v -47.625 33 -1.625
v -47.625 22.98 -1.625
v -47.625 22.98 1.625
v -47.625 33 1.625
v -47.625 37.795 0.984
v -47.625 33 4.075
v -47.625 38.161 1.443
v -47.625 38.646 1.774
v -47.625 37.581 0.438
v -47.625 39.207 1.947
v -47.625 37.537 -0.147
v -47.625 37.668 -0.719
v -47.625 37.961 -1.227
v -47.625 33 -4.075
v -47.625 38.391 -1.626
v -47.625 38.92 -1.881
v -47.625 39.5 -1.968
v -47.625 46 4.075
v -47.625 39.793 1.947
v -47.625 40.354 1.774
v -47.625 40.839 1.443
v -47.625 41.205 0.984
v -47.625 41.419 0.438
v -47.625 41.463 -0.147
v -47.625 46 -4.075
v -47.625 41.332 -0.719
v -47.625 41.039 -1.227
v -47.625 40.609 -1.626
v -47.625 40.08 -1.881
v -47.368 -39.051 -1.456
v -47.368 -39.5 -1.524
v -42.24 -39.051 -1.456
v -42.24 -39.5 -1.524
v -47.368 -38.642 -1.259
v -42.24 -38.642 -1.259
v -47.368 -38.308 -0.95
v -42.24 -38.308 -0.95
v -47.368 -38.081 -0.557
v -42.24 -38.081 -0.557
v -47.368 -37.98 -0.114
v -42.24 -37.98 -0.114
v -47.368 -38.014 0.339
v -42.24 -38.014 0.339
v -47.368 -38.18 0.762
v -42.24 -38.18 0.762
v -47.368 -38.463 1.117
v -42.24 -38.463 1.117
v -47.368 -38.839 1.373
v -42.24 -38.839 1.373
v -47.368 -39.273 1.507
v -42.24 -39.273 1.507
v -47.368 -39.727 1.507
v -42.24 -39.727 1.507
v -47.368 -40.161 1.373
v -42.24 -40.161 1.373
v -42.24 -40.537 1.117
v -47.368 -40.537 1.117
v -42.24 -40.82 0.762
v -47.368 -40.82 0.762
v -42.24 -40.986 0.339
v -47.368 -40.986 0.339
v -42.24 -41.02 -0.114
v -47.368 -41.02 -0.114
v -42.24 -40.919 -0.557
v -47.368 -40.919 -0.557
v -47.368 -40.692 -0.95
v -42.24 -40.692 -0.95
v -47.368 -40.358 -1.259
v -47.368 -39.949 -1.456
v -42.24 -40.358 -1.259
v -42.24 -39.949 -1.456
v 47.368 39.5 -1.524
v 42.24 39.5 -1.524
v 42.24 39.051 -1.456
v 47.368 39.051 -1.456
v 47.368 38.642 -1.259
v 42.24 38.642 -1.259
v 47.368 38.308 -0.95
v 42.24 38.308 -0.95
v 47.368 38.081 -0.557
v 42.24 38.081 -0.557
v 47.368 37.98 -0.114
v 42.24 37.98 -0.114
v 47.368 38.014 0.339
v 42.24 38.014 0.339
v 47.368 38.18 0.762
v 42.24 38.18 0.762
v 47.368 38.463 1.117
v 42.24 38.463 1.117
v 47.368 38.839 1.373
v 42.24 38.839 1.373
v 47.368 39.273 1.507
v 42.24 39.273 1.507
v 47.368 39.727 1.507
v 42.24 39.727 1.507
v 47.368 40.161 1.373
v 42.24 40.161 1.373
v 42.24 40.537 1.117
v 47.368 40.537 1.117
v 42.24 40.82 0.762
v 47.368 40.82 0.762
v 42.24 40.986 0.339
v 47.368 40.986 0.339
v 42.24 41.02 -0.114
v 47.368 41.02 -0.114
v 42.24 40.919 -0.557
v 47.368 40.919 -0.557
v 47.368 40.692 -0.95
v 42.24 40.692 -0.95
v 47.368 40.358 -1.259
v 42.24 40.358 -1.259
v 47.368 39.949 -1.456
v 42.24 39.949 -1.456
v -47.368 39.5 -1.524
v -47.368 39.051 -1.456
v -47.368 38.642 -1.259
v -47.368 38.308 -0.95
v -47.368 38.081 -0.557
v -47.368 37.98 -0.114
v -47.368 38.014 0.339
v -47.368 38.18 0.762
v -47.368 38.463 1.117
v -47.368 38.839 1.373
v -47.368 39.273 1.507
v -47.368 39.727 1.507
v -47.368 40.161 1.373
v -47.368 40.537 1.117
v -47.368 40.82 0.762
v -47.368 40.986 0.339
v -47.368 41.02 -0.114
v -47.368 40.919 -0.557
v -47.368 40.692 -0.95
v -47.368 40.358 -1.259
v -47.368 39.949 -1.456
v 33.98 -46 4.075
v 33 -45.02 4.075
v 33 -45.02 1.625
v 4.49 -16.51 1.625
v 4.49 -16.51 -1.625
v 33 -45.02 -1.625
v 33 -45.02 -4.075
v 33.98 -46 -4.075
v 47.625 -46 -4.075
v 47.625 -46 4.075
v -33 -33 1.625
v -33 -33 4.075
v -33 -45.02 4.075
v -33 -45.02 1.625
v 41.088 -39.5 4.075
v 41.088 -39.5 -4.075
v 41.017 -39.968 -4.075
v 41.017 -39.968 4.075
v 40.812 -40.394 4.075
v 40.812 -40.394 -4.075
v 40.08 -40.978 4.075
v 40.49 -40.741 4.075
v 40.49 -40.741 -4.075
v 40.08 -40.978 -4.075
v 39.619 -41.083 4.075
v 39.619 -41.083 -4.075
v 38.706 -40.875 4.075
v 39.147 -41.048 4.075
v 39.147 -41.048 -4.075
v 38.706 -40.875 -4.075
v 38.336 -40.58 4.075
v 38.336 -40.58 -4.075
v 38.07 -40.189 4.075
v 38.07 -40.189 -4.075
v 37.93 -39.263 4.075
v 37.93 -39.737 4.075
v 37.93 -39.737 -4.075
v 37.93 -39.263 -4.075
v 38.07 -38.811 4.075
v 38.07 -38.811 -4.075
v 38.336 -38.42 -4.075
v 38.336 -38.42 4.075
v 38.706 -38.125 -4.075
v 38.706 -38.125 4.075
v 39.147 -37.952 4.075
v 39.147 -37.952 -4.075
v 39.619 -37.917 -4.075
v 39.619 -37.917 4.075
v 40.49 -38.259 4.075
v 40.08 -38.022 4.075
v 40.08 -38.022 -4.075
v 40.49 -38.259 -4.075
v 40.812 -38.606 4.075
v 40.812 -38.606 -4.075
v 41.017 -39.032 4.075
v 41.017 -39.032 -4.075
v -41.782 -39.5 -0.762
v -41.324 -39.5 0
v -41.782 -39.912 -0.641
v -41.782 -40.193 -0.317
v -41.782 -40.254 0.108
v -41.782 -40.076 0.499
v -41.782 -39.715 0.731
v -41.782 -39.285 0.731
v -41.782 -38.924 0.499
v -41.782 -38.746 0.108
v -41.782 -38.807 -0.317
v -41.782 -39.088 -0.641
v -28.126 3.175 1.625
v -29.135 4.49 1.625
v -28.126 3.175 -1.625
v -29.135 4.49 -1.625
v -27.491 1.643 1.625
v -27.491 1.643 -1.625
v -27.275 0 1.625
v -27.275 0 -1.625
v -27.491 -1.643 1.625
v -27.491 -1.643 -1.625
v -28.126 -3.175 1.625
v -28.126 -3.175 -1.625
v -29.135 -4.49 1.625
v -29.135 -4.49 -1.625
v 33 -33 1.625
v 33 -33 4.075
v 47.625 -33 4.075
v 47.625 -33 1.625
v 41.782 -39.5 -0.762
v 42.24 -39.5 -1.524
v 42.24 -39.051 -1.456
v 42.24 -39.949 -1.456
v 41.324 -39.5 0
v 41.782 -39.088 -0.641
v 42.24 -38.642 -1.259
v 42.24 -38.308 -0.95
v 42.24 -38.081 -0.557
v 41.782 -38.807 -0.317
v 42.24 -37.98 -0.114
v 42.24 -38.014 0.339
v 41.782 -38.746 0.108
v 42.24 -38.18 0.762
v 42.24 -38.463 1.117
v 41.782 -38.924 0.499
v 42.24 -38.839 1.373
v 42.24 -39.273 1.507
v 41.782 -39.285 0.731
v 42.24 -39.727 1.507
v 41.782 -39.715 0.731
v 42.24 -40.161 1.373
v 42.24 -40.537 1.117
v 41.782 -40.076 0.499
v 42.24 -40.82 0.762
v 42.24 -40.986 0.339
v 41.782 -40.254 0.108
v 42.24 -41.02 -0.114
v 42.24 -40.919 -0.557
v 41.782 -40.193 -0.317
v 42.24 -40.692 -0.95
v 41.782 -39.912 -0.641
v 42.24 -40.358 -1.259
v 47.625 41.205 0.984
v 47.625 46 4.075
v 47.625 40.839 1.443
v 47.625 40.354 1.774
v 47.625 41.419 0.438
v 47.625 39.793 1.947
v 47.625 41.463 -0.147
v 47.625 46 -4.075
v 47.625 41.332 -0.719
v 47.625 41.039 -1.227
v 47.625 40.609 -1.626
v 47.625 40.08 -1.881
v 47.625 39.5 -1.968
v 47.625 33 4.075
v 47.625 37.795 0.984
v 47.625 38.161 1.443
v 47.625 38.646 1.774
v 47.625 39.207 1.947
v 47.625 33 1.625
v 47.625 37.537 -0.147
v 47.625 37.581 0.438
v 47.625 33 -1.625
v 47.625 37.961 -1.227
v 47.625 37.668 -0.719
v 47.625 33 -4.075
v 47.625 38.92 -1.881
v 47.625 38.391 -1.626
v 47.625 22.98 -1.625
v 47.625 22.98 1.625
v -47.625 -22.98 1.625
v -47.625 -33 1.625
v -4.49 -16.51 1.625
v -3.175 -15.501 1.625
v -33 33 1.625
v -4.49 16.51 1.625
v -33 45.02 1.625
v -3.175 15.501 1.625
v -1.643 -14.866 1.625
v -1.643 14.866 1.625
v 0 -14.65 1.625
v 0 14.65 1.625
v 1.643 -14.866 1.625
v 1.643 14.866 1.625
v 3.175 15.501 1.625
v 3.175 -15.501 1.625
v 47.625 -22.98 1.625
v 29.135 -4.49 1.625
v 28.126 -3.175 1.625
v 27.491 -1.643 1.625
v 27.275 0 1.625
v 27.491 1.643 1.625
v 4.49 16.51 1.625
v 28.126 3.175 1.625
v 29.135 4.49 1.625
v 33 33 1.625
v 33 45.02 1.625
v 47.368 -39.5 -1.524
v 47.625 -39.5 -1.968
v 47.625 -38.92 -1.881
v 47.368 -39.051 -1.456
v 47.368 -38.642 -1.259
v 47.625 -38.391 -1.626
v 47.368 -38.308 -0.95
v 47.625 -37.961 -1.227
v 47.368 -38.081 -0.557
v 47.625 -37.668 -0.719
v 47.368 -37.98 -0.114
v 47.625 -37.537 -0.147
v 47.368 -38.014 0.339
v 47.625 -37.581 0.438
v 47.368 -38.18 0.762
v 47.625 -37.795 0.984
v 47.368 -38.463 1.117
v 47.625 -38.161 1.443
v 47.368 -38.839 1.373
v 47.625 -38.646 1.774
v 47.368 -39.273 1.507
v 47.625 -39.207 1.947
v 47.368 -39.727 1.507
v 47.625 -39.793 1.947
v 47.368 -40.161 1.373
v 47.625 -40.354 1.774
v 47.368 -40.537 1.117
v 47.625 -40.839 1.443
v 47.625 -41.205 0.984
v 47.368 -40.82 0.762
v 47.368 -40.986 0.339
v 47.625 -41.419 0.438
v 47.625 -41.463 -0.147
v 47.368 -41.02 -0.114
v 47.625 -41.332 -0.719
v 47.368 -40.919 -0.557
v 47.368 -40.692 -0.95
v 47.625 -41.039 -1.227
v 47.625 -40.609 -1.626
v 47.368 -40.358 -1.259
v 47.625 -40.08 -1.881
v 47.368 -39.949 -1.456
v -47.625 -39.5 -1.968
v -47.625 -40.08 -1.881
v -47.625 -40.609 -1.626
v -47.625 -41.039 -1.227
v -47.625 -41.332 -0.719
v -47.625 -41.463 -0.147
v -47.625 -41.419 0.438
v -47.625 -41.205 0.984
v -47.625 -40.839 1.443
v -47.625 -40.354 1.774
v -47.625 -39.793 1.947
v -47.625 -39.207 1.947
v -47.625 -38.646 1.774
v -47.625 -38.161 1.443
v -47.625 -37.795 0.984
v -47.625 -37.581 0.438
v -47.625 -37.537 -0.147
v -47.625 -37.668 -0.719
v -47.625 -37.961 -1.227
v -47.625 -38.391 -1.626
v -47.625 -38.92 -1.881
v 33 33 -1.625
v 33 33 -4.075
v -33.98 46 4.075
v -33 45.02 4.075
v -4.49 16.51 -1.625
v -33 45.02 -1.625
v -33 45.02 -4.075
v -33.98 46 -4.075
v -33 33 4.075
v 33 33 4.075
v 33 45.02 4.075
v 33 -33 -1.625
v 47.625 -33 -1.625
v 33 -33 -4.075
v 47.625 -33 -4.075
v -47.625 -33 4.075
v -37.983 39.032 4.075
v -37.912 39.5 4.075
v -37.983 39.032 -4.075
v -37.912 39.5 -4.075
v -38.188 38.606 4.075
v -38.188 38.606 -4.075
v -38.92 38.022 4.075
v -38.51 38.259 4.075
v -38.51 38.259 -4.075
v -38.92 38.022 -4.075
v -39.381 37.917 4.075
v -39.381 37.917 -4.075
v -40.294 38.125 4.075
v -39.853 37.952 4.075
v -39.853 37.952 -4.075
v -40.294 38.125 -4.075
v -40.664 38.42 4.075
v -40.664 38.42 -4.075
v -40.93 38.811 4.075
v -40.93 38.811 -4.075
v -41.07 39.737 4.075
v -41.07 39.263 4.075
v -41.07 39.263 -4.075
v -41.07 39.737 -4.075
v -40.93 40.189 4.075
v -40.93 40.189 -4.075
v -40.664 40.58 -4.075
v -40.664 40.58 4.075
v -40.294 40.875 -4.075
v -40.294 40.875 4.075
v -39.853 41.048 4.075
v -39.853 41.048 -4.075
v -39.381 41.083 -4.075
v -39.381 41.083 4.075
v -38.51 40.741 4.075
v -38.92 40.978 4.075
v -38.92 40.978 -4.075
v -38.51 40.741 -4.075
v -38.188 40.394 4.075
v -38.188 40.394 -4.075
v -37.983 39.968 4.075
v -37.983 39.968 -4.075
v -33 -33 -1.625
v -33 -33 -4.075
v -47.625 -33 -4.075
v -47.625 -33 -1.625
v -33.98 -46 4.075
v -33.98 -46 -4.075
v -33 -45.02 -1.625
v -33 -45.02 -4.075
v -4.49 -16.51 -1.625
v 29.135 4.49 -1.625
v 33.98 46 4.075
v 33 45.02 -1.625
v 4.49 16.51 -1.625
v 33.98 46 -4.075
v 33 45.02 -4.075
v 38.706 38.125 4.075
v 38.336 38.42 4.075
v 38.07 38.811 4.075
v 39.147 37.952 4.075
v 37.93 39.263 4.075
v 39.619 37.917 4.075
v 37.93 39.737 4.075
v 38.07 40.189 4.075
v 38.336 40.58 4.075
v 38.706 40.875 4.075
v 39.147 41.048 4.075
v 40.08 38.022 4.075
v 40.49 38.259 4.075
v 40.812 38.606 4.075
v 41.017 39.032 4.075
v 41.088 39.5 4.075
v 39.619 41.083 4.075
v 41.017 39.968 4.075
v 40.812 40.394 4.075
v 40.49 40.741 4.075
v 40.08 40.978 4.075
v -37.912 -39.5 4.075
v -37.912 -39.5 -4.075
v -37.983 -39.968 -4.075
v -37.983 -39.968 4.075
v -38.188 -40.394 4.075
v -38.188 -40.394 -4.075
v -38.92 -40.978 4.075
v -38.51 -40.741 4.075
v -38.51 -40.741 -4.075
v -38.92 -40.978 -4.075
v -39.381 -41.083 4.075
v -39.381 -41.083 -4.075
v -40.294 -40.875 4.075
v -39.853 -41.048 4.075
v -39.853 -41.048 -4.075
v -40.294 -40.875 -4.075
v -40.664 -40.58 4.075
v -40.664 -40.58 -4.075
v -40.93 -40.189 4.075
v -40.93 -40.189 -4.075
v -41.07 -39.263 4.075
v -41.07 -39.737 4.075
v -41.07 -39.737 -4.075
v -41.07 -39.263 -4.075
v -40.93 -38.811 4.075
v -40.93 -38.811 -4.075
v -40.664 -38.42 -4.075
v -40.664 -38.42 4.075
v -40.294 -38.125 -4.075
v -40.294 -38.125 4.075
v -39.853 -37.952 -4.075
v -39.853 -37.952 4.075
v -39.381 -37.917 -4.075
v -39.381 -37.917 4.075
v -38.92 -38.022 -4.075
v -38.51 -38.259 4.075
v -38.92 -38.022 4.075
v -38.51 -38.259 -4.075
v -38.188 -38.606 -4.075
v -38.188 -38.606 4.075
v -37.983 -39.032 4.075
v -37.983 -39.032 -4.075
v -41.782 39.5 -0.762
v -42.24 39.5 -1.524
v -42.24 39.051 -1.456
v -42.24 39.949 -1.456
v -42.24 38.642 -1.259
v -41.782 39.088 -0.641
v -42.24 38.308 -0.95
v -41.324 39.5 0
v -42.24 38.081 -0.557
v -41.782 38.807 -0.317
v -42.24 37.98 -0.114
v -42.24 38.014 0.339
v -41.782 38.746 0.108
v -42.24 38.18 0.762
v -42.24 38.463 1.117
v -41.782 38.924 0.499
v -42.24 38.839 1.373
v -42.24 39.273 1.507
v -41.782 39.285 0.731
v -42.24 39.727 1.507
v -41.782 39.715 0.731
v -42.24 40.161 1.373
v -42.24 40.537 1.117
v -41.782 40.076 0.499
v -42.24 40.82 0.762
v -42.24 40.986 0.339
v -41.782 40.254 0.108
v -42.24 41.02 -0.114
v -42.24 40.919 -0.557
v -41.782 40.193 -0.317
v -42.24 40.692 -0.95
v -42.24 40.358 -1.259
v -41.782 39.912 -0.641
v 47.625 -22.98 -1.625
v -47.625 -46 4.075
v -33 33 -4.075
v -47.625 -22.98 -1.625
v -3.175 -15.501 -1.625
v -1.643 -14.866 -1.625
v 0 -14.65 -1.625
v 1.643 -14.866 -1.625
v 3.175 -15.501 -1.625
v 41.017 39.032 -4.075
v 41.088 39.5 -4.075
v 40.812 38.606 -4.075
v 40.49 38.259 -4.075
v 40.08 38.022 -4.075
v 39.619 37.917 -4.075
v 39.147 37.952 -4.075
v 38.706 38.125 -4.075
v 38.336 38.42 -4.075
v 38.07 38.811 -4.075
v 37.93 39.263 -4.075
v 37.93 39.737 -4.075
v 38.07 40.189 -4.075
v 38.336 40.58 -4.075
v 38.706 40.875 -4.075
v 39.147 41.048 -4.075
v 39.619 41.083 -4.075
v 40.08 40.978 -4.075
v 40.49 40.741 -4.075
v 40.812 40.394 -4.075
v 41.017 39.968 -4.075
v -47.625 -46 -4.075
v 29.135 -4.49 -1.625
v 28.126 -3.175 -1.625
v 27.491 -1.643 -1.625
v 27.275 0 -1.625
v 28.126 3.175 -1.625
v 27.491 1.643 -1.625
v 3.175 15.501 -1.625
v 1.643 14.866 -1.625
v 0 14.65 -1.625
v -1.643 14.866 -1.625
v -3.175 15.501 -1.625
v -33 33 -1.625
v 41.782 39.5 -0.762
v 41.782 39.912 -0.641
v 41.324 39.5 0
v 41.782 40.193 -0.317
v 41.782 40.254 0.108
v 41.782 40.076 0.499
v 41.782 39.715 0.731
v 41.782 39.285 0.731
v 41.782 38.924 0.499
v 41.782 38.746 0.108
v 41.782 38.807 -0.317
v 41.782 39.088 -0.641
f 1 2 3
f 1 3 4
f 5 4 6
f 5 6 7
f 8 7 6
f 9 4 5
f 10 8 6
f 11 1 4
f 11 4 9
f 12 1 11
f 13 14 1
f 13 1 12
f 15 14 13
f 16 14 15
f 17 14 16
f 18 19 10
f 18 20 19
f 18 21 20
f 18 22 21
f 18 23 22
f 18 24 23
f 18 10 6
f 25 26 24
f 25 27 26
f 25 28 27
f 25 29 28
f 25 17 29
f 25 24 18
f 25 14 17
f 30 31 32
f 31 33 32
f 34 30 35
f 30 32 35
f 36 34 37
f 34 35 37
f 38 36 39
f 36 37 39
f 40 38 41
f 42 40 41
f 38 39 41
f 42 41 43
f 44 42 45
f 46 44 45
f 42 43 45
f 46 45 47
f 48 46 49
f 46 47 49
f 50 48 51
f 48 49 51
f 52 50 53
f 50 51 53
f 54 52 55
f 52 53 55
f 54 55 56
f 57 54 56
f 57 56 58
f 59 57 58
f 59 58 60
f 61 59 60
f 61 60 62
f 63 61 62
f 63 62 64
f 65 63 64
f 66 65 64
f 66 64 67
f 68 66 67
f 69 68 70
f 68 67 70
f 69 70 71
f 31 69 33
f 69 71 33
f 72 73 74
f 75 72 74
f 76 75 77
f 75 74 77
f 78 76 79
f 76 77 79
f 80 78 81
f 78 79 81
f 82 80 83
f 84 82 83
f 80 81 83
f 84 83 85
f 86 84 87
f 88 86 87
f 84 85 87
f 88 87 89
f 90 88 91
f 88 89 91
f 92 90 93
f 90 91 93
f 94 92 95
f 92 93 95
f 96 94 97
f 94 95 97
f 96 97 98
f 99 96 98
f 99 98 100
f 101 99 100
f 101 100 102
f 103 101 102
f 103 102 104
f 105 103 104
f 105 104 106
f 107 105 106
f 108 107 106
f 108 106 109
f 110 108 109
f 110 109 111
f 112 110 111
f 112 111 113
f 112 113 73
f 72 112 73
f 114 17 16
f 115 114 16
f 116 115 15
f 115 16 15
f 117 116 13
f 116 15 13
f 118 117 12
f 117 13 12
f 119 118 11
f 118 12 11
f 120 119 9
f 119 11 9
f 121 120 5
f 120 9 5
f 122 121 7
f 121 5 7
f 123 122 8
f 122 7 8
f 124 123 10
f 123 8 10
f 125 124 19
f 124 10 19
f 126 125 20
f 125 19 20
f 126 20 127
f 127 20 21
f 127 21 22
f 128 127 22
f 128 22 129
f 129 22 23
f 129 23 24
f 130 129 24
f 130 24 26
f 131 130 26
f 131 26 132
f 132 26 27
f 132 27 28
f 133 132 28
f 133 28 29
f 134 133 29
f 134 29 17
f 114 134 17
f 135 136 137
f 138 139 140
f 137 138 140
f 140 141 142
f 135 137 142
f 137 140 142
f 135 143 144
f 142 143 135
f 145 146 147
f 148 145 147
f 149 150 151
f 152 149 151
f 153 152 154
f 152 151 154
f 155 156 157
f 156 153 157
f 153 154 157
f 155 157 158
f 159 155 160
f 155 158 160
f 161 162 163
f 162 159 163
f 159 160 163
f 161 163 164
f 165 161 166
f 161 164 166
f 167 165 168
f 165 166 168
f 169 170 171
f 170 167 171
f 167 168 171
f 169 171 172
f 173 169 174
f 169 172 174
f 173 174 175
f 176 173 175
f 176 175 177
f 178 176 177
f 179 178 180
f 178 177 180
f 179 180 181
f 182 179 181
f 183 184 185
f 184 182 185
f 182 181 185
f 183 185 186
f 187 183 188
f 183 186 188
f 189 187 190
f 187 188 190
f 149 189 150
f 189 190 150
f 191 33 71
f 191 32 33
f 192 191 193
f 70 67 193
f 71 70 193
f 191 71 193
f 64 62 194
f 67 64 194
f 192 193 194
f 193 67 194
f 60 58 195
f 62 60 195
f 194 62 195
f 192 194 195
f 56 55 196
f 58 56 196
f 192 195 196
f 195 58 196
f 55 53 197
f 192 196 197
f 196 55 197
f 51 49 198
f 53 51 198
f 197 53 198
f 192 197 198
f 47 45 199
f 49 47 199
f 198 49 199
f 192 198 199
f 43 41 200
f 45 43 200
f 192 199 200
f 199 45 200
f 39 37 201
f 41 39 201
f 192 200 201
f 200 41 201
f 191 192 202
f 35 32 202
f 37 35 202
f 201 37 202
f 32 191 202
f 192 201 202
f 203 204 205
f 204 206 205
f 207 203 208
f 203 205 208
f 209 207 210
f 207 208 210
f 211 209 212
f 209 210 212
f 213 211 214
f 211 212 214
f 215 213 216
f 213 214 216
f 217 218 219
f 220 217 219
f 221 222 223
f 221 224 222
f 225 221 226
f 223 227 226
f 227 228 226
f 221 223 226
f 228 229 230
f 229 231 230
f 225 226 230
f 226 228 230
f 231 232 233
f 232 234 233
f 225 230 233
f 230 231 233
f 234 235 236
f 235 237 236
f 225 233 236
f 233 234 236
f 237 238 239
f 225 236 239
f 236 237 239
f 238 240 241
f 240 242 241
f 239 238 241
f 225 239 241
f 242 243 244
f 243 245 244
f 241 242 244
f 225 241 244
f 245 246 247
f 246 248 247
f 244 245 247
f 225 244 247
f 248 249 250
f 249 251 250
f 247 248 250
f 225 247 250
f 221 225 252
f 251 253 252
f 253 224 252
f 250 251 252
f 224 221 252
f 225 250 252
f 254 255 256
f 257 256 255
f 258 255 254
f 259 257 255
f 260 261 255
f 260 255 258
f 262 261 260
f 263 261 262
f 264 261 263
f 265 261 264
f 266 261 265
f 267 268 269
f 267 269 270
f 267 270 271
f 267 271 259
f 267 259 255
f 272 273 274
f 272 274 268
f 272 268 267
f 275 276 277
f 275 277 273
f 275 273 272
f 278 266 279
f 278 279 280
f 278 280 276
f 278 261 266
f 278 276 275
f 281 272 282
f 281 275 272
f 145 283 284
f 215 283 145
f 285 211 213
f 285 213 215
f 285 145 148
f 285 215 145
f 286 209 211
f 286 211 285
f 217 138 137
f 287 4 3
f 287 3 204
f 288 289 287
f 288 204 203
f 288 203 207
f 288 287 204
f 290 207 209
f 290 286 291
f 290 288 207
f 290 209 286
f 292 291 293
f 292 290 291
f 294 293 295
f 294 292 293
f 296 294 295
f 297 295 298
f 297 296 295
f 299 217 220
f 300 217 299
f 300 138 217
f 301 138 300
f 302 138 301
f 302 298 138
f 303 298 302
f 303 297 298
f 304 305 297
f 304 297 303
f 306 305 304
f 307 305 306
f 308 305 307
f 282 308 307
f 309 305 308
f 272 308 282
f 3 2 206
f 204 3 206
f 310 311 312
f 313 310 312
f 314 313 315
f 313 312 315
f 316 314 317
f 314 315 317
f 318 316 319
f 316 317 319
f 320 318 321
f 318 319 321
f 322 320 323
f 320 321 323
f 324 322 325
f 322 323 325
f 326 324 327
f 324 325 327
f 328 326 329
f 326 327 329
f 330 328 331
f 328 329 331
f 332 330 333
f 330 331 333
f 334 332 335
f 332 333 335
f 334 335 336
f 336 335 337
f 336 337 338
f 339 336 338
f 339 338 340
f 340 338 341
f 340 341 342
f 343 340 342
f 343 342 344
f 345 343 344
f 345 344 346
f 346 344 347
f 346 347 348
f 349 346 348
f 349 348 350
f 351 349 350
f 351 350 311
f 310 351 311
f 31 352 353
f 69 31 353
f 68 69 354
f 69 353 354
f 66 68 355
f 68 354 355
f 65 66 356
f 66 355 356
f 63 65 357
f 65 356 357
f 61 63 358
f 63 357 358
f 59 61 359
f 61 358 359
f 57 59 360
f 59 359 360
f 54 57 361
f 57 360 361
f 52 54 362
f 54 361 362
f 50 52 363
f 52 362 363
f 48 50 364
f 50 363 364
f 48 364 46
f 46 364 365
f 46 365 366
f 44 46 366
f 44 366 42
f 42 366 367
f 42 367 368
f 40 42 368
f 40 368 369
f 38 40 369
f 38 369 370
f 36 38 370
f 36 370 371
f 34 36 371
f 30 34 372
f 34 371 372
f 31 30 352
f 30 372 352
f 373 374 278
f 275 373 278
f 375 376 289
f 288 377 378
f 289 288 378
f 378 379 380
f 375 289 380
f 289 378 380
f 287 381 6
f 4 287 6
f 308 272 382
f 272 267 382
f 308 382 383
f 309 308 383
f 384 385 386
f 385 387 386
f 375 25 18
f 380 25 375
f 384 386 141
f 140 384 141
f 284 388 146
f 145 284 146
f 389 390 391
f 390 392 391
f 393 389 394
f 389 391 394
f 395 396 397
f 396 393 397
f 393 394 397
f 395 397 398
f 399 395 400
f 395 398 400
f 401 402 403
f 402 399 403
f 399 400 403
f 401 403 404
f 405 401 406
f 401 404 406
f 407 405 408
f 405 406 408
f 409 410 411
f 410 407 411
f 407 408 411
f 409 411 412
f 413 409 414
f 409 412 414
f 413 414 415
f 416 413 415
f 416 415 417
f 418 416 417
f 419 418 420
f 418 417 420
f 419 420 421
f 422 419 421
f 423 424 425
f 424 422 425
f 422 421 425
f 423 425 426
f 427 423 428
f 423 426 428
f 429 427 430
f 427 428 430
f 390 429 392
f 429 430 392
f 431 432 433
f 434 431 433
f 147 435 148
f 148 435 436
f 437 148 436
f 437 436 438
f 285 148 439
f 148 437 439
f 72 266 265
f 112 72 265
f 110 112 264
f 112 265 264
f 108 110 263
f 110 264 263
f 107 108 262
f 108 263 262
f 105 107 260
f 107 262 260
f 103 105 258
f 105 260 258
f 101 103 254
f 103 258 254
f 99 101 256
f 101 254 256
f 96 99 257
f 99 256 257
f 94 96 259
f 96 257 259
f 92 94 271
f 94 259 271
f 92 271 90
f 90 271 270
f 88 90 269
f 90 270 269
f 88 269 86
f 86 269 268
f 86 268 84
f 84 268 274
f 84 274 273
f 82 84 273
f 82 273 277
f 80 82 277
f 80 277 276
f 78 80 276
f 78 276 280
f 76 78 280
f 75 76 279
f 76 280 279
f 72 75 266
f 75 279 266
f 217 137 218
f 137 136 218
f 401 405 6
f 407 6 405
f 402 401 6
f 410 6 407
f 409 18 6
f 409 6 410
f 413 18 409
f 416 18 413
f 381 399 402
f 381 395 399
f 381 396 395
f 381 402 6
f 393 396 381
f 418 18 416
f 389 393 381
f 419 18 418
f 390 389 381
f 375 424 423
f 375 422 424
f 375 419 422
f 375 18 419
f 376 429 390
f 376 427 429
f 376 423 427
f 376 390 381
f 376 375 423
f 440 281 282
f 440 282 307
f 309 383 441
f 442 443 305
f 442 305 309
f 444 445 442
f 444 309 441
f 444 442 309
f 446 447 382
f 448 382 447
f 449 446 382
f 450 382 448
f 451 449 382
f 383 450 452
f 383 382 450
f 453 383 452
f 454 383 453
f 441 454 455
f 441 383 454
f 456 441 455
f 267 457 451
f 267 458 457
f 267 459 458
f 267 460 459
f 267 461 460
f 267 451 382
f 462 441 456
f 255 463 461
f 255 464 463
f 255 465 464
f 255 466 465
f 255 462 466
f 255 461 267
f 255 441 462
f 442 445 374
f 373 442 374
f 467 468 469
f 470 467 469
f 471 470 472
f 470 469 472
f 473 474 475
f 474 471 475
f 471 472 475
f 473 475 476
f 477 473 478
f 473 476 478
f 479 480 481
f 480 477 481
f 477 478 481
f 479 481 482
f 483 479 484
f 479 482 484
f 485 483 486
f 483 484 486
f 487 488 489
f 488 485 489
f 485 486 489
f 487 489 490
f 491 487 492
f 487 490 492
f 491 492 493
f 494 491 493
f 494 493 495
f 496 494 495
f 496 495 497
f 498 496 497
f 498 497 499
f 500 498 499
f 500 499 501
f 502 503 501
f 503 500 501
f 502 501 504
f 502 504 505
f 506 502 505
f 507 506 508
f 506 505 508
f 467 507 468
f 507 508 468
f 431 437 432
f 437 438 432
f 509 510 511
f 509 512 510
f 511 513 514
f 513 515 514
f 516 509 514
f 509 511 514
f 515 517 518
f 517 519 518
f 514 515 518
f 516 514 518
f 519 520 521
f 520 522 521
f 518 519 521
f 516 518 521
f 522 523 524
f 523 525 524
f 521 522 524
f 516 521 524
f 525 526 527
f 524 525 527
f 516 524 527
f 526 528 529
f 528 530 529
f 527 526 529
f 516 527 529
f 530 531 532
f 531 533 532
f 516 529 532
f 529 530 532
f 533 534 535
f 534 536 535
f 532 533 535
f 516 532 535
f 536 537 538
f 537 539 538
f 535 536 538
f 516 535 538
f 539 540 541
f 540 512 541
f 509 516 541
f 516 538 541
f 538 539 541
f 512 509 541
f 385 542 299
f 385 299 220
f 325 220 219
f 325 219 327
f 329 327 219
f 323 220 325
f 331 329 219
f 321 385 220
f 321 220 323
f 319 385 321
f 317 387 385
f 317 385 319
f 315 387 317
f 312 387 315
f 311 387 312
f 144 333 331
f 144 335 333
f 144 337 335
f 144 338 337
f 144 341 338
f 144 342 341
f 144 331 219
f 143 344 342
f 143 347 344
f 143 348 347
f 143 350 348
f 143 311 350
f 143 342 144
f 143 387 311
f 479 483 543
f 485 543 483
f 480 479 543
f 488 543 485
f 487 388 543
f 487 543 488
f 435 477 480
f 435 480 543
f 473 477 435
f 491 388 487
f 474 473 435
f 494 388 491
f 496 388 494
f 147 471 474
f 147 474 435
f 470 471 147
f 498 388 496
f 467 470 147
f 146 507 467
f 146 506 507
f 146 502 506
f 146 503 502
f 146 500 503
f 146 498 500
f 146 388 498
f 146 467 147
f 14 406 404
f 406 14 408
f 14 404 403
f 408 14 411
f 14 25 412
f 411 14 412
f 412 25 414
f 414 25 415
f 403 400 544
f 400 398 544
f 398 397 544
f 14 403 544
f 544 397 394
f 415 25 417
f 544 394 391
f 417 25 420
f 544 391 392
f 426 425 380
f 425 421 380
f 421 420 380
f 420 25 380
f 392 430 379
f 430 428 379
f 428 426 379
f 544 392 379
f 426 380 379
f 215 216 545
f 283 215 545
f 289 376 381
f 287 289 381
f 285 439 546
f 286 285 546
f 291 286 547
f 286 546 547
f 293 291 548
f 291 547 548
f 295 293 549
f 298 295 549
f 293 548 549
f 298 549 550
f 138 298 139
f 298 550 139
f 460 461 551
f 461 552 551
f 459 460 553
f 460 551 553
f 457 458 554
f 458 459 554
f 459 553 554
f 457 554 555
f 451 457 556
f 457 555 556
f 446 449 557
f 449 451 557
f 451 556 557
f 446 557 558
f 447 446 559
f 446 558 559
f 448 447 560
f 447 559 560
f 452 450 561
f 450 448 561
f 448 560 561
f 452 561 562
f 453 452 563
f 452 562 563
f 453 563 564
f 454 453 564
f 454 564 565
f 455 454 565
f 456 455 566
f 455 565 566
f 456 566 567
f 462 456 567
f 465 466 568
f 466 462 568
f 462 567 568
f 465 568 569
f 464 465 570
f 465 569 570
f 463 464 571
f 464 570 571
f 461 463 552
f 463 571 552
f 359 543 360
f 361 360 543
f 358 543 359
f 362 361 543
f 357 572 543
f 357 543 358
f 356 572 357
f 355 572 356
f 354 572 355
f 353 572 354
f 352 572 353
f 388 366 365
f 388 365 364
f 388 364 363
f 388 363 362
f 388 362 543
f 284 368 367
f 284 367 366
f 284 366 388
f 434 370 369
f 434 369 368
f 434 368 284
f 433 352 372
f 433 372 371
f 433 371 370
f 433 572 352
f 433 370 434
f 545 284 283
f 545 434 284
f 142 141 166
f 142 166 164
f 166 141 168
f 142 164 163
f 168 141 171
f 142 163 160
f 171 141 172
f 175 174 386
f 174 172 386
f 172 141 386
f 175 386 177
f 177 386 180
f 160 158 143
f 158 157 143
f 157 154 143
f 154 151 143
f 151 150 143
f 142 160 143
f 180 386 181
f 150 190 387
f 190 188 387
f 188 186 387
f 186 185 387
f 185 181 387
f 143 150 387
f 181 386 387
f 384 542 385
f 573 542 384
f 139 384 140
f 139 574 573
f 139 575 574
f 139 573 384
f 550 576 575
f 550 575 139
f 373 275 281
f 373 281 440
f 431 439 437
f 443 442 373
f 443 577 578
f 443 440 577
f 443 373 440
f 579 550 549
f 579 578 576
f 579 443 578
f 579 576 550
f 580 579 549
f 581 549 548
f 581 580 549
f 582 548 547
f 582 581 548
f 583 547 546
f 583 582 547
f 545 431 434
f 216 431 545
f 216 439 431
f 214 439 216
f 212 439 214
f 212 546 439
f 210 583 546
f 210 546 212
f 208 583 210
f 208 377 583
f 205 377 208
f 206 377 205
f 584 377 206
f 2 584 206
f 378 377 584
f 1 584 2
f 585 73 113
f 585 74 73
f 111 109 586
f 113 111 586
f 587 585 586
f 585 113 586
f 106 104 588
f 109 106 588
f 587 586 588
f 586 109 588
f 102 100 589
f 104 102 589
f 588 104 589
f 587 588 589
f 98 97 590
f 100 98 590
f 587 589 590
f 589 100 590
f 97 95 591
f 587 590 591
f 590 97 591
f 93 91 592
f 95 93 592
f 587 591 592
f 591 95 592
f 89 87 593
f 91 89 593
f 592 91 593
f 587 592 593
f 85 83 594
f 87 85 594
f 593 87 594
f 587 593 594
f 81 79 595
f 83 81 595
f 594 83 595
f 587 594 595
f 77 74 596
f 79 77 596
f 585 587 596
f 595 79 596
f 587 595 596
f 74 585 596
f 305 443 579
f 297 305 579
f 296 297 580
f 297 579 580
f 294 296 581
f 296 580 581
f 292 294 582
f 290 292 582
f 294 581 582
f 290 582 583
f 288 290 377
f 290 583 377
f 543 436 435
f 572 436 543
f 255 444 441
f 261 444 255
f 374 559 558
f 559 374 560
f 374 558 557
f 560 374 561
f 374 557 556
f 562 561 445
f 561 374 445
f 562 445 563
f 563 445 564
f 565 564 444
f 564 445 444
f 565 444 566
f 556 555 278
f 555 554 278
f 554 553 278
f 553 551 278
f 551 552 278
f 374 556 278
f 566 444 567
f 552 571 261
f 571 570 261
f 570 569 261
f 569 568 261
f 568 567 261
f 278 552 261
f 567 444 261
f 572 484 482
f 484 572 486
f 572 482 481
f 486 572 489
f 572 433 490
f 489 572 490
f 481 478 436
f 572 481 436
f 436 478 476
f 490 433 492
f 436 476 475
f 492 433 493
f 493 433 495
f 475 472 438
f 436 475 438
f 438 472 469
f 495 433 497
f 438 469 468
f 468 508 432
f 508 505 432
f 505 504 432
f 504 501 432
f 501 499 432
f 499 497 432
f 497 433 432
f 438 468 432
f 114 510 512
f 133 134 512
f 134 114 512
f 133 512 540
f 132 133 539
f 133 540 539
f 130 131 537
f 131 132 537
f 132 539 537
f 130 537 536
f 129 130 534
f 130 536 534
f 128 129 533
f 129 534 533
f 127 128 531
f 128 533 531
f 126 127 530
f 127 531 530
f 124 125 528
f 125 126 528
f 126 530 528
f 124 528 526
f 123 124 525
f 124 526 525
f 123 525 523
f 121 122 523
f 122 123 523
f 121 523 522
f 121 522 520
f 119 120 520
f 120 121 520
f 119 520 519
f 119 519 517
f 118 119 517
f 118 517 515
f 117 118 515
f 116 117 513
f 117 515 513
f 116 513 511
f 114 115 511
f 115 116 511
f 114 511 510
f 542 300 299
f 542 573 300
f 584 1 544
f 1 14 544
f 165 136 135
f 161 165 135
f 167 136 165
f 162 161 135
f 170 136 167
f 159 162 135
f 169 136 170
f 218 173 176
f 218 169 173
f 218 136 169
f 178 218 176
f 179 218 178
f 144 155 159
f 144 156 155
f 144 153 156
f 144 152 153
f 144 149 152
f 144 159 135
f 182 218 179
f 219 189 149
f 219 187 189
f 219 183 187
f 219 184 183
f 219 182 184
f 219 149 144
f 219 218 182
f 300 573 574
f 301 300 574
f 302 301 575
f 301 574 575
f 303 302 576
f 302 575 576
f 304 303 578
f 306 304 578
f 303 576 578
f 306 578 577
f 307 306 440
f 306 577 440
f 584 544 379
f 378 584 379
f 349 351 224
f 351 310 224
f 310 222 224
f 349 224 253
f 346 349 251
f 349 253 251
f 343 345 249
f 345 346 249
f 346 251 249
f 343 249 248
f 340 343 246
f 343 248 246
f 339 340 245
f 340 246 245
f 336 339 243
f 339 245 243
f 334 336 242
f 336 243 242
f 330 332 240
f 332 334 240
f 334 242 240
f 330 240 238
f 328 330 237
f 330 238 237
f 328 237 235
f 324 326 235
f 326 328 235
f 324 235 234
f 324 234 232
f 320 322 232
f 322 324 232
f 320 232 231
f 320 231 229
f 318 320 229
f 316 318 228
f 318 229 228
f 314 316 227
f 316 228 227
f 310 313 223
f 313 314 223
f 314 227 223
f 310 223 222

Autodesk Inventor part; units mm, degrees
ref_plane "YZ Plane" through (0, 0, 0) normal (1, 0, 0) x (0, 1, 0)
ref_plane "XZ Plane" through (0, 0, 0) normal (0, 1, 0) x (-1, 0, 0)
ref_plane "XY Plane" through (0, 0, 0) normal (0, 0, 1) x (1, 0, 0)
sketch "Sketch1" plane through (0, 0, 0) normal (0, 0, 1) x (1, 0, 0)
  circle A0 centre (-39.5, 39.5) radius 1.5875
  circle A1 centre (39.5, 39.5) radius 1.5875
  circle A2 centre (39.5, -39.5) radius 1.5875
  circle A3 centre (-39.5, -39.5) radius 1.5875
  line L0 (0, 0) -> (0, 46)
  line L1 (0, 0) -> (49.2895, 0)
  line L2 (-4.4901, 16.5099) -> (-33.9803, 46)
  line L3 (4.4901, 16.5099) -> (33.9803, 46)
  line L4 (-33.9803, -46) -> (-4.4901, -16.5099)
  line L5 (4.4901, -16.5099) -> (33.9803, -46)
  line L6 (-47.625, 46) -> (-33.9803, 46)
  line L7 (33.9803, 46) -> (47.625, 46)
  line L8 (47.625, -46) -> (33.9803, -46)
  line L9 (-33.9803, -46) -> (-47.625, -46)
  arc A4 (-4.4901, 16.5099) -> (4.4901, 16.5099) centre (0, 21) ccw
  arc A5 (4.4901, -16.5099) -> (-4.4901, -16.5099) centre (0, -21) ccw
  line L10 (-47.625, 22.9803) -> (-29.1349, 4.4901)
  line L11 (-29.1349, -4.4901) -> (-47.625, -22.9803)
  line L12 (47.625, 22.9803) -> (29.1349, 4.4901)
  line L13 (29.1349, -4.4901) -> (47.625, -22.9803)
  arc A6 (-29.1349, -4.4901) -> (-29.1349, 4.4901) centre (-33.625, 0) ccw
  arc A7 (29.1349, 4.4901) -> (29.1349, -4.4901) centre (33.625, 0) ccw
  line L14 (47.625, 46) -> (47.625, 22.9803)
  line L15 (47.625, -22.9803) -> (47.625, -46)
  line L16 (-47.625, -46) -> (-47.625, -22.9803)
  line L17 (-47.625, 22.9803) -> (-47.625, 46)
  point P0 (0, 12.0197)
  point P1 (0, -12.0197)
  point P2 (-24.6447, 0)
  point P3 (24.6447, 0)
  dimension "d0" = 79
  dimension "d1" = 79
  dimension "d2" = 3.175
  dimension "d5" = 6.35
  dimension "d6" = 25
  dimension "d7" = 25
  dimension "d8" = 92
  dimension "d9" = 6.35
  dimension "d10" = 95.25
  dimension "d11" = 14
extrude "Extrusion1" add sketch "Sketch1" along normal mid plane 8.15
sketch "Sketch2" plane through (0, 0, 4.075) normal (0, 0, 1) x (1, 0, 0)
  circle A0 centre (-39.5, -39.5) radius 1.5875 projected
  circle A1 centre (39.5, 39.5) radius 1.5875 projected
  circle A2 centre (-39.5, 39.5) radius 1.5875 projected
  line L0 (-33.9803, 46) -> (-47.625, 46) projected
  line L1 (-47.625, 46) -> (-47.625, 22.9803) projected
  line L2 (-47.625, -46) -> (-33.9803, -46) projected
  line L3 (47.625, 46) -> (33.9803, 46) projected
  line L4 (-33, 46) -> (-33, 33)
  line L5 (-33, 33) -> (-47.625, 33)
  line L6 (-47.625, 33) -> (-47.625, -33)
  line L7 (-47.625, -33) -> (-33, -33)
  line L8 (-33, -33) -> (-33, -46)
  line L9 (-33, -46) -> (33, -46)
  line L10 (33, -46) -> (33, -33)
  line L11 (33, -33) -> (47.625, -33)
  line L12 (47.625, -33) -> (47.625, 33)
  line L13 (47.625, 33) -> (33, 33)
  line L14 (33, 33) -> (33, 46)
  line L15 (33, 46) -> (-33, 46)
  point P0 (0, 0)
  dimension "d14" = 6.5
  dimension "d15" = 6.5
  dimension "d16" = 6.5
  dimension "d17" = 6.5
extrude "Extrusion2" cut sketch "Sketch2" against normal blind 2.45 contours L5 L4 L15 L14 L13 L12 L11 L10 L9 L8 L7 L6 L1
mirror "Mirror1" about plane through (0, 0, 0) normal (0, 0, 1) of "Extrusion2"
hole "Hole1" at (47.625, 39.5, 0) direction (-1, 0, 0) diameter 3.048 depth 5.3848 tip angle 118 countersink diameter 3.937 countersink angle 120
mirror "Mirror2" about plane through (0, 0, 0) normal (0, 1, 0) of "Hole1"
mirror "Mirror3" about plane through (0, 0, 0) normal (1, 0, 0) of "Hole1", "Mirror2"
ref_plane "Work Plane3" through (-27.275, 0, 1.625) normal (0, -1, 0) x (1, 0, 0)
ref_plane "Work Plane4" through (0, -14.65, 1.625) normal (1, 0, 0) x (0, 0, -1)
properties part number "RT-IHU_heatsink"
